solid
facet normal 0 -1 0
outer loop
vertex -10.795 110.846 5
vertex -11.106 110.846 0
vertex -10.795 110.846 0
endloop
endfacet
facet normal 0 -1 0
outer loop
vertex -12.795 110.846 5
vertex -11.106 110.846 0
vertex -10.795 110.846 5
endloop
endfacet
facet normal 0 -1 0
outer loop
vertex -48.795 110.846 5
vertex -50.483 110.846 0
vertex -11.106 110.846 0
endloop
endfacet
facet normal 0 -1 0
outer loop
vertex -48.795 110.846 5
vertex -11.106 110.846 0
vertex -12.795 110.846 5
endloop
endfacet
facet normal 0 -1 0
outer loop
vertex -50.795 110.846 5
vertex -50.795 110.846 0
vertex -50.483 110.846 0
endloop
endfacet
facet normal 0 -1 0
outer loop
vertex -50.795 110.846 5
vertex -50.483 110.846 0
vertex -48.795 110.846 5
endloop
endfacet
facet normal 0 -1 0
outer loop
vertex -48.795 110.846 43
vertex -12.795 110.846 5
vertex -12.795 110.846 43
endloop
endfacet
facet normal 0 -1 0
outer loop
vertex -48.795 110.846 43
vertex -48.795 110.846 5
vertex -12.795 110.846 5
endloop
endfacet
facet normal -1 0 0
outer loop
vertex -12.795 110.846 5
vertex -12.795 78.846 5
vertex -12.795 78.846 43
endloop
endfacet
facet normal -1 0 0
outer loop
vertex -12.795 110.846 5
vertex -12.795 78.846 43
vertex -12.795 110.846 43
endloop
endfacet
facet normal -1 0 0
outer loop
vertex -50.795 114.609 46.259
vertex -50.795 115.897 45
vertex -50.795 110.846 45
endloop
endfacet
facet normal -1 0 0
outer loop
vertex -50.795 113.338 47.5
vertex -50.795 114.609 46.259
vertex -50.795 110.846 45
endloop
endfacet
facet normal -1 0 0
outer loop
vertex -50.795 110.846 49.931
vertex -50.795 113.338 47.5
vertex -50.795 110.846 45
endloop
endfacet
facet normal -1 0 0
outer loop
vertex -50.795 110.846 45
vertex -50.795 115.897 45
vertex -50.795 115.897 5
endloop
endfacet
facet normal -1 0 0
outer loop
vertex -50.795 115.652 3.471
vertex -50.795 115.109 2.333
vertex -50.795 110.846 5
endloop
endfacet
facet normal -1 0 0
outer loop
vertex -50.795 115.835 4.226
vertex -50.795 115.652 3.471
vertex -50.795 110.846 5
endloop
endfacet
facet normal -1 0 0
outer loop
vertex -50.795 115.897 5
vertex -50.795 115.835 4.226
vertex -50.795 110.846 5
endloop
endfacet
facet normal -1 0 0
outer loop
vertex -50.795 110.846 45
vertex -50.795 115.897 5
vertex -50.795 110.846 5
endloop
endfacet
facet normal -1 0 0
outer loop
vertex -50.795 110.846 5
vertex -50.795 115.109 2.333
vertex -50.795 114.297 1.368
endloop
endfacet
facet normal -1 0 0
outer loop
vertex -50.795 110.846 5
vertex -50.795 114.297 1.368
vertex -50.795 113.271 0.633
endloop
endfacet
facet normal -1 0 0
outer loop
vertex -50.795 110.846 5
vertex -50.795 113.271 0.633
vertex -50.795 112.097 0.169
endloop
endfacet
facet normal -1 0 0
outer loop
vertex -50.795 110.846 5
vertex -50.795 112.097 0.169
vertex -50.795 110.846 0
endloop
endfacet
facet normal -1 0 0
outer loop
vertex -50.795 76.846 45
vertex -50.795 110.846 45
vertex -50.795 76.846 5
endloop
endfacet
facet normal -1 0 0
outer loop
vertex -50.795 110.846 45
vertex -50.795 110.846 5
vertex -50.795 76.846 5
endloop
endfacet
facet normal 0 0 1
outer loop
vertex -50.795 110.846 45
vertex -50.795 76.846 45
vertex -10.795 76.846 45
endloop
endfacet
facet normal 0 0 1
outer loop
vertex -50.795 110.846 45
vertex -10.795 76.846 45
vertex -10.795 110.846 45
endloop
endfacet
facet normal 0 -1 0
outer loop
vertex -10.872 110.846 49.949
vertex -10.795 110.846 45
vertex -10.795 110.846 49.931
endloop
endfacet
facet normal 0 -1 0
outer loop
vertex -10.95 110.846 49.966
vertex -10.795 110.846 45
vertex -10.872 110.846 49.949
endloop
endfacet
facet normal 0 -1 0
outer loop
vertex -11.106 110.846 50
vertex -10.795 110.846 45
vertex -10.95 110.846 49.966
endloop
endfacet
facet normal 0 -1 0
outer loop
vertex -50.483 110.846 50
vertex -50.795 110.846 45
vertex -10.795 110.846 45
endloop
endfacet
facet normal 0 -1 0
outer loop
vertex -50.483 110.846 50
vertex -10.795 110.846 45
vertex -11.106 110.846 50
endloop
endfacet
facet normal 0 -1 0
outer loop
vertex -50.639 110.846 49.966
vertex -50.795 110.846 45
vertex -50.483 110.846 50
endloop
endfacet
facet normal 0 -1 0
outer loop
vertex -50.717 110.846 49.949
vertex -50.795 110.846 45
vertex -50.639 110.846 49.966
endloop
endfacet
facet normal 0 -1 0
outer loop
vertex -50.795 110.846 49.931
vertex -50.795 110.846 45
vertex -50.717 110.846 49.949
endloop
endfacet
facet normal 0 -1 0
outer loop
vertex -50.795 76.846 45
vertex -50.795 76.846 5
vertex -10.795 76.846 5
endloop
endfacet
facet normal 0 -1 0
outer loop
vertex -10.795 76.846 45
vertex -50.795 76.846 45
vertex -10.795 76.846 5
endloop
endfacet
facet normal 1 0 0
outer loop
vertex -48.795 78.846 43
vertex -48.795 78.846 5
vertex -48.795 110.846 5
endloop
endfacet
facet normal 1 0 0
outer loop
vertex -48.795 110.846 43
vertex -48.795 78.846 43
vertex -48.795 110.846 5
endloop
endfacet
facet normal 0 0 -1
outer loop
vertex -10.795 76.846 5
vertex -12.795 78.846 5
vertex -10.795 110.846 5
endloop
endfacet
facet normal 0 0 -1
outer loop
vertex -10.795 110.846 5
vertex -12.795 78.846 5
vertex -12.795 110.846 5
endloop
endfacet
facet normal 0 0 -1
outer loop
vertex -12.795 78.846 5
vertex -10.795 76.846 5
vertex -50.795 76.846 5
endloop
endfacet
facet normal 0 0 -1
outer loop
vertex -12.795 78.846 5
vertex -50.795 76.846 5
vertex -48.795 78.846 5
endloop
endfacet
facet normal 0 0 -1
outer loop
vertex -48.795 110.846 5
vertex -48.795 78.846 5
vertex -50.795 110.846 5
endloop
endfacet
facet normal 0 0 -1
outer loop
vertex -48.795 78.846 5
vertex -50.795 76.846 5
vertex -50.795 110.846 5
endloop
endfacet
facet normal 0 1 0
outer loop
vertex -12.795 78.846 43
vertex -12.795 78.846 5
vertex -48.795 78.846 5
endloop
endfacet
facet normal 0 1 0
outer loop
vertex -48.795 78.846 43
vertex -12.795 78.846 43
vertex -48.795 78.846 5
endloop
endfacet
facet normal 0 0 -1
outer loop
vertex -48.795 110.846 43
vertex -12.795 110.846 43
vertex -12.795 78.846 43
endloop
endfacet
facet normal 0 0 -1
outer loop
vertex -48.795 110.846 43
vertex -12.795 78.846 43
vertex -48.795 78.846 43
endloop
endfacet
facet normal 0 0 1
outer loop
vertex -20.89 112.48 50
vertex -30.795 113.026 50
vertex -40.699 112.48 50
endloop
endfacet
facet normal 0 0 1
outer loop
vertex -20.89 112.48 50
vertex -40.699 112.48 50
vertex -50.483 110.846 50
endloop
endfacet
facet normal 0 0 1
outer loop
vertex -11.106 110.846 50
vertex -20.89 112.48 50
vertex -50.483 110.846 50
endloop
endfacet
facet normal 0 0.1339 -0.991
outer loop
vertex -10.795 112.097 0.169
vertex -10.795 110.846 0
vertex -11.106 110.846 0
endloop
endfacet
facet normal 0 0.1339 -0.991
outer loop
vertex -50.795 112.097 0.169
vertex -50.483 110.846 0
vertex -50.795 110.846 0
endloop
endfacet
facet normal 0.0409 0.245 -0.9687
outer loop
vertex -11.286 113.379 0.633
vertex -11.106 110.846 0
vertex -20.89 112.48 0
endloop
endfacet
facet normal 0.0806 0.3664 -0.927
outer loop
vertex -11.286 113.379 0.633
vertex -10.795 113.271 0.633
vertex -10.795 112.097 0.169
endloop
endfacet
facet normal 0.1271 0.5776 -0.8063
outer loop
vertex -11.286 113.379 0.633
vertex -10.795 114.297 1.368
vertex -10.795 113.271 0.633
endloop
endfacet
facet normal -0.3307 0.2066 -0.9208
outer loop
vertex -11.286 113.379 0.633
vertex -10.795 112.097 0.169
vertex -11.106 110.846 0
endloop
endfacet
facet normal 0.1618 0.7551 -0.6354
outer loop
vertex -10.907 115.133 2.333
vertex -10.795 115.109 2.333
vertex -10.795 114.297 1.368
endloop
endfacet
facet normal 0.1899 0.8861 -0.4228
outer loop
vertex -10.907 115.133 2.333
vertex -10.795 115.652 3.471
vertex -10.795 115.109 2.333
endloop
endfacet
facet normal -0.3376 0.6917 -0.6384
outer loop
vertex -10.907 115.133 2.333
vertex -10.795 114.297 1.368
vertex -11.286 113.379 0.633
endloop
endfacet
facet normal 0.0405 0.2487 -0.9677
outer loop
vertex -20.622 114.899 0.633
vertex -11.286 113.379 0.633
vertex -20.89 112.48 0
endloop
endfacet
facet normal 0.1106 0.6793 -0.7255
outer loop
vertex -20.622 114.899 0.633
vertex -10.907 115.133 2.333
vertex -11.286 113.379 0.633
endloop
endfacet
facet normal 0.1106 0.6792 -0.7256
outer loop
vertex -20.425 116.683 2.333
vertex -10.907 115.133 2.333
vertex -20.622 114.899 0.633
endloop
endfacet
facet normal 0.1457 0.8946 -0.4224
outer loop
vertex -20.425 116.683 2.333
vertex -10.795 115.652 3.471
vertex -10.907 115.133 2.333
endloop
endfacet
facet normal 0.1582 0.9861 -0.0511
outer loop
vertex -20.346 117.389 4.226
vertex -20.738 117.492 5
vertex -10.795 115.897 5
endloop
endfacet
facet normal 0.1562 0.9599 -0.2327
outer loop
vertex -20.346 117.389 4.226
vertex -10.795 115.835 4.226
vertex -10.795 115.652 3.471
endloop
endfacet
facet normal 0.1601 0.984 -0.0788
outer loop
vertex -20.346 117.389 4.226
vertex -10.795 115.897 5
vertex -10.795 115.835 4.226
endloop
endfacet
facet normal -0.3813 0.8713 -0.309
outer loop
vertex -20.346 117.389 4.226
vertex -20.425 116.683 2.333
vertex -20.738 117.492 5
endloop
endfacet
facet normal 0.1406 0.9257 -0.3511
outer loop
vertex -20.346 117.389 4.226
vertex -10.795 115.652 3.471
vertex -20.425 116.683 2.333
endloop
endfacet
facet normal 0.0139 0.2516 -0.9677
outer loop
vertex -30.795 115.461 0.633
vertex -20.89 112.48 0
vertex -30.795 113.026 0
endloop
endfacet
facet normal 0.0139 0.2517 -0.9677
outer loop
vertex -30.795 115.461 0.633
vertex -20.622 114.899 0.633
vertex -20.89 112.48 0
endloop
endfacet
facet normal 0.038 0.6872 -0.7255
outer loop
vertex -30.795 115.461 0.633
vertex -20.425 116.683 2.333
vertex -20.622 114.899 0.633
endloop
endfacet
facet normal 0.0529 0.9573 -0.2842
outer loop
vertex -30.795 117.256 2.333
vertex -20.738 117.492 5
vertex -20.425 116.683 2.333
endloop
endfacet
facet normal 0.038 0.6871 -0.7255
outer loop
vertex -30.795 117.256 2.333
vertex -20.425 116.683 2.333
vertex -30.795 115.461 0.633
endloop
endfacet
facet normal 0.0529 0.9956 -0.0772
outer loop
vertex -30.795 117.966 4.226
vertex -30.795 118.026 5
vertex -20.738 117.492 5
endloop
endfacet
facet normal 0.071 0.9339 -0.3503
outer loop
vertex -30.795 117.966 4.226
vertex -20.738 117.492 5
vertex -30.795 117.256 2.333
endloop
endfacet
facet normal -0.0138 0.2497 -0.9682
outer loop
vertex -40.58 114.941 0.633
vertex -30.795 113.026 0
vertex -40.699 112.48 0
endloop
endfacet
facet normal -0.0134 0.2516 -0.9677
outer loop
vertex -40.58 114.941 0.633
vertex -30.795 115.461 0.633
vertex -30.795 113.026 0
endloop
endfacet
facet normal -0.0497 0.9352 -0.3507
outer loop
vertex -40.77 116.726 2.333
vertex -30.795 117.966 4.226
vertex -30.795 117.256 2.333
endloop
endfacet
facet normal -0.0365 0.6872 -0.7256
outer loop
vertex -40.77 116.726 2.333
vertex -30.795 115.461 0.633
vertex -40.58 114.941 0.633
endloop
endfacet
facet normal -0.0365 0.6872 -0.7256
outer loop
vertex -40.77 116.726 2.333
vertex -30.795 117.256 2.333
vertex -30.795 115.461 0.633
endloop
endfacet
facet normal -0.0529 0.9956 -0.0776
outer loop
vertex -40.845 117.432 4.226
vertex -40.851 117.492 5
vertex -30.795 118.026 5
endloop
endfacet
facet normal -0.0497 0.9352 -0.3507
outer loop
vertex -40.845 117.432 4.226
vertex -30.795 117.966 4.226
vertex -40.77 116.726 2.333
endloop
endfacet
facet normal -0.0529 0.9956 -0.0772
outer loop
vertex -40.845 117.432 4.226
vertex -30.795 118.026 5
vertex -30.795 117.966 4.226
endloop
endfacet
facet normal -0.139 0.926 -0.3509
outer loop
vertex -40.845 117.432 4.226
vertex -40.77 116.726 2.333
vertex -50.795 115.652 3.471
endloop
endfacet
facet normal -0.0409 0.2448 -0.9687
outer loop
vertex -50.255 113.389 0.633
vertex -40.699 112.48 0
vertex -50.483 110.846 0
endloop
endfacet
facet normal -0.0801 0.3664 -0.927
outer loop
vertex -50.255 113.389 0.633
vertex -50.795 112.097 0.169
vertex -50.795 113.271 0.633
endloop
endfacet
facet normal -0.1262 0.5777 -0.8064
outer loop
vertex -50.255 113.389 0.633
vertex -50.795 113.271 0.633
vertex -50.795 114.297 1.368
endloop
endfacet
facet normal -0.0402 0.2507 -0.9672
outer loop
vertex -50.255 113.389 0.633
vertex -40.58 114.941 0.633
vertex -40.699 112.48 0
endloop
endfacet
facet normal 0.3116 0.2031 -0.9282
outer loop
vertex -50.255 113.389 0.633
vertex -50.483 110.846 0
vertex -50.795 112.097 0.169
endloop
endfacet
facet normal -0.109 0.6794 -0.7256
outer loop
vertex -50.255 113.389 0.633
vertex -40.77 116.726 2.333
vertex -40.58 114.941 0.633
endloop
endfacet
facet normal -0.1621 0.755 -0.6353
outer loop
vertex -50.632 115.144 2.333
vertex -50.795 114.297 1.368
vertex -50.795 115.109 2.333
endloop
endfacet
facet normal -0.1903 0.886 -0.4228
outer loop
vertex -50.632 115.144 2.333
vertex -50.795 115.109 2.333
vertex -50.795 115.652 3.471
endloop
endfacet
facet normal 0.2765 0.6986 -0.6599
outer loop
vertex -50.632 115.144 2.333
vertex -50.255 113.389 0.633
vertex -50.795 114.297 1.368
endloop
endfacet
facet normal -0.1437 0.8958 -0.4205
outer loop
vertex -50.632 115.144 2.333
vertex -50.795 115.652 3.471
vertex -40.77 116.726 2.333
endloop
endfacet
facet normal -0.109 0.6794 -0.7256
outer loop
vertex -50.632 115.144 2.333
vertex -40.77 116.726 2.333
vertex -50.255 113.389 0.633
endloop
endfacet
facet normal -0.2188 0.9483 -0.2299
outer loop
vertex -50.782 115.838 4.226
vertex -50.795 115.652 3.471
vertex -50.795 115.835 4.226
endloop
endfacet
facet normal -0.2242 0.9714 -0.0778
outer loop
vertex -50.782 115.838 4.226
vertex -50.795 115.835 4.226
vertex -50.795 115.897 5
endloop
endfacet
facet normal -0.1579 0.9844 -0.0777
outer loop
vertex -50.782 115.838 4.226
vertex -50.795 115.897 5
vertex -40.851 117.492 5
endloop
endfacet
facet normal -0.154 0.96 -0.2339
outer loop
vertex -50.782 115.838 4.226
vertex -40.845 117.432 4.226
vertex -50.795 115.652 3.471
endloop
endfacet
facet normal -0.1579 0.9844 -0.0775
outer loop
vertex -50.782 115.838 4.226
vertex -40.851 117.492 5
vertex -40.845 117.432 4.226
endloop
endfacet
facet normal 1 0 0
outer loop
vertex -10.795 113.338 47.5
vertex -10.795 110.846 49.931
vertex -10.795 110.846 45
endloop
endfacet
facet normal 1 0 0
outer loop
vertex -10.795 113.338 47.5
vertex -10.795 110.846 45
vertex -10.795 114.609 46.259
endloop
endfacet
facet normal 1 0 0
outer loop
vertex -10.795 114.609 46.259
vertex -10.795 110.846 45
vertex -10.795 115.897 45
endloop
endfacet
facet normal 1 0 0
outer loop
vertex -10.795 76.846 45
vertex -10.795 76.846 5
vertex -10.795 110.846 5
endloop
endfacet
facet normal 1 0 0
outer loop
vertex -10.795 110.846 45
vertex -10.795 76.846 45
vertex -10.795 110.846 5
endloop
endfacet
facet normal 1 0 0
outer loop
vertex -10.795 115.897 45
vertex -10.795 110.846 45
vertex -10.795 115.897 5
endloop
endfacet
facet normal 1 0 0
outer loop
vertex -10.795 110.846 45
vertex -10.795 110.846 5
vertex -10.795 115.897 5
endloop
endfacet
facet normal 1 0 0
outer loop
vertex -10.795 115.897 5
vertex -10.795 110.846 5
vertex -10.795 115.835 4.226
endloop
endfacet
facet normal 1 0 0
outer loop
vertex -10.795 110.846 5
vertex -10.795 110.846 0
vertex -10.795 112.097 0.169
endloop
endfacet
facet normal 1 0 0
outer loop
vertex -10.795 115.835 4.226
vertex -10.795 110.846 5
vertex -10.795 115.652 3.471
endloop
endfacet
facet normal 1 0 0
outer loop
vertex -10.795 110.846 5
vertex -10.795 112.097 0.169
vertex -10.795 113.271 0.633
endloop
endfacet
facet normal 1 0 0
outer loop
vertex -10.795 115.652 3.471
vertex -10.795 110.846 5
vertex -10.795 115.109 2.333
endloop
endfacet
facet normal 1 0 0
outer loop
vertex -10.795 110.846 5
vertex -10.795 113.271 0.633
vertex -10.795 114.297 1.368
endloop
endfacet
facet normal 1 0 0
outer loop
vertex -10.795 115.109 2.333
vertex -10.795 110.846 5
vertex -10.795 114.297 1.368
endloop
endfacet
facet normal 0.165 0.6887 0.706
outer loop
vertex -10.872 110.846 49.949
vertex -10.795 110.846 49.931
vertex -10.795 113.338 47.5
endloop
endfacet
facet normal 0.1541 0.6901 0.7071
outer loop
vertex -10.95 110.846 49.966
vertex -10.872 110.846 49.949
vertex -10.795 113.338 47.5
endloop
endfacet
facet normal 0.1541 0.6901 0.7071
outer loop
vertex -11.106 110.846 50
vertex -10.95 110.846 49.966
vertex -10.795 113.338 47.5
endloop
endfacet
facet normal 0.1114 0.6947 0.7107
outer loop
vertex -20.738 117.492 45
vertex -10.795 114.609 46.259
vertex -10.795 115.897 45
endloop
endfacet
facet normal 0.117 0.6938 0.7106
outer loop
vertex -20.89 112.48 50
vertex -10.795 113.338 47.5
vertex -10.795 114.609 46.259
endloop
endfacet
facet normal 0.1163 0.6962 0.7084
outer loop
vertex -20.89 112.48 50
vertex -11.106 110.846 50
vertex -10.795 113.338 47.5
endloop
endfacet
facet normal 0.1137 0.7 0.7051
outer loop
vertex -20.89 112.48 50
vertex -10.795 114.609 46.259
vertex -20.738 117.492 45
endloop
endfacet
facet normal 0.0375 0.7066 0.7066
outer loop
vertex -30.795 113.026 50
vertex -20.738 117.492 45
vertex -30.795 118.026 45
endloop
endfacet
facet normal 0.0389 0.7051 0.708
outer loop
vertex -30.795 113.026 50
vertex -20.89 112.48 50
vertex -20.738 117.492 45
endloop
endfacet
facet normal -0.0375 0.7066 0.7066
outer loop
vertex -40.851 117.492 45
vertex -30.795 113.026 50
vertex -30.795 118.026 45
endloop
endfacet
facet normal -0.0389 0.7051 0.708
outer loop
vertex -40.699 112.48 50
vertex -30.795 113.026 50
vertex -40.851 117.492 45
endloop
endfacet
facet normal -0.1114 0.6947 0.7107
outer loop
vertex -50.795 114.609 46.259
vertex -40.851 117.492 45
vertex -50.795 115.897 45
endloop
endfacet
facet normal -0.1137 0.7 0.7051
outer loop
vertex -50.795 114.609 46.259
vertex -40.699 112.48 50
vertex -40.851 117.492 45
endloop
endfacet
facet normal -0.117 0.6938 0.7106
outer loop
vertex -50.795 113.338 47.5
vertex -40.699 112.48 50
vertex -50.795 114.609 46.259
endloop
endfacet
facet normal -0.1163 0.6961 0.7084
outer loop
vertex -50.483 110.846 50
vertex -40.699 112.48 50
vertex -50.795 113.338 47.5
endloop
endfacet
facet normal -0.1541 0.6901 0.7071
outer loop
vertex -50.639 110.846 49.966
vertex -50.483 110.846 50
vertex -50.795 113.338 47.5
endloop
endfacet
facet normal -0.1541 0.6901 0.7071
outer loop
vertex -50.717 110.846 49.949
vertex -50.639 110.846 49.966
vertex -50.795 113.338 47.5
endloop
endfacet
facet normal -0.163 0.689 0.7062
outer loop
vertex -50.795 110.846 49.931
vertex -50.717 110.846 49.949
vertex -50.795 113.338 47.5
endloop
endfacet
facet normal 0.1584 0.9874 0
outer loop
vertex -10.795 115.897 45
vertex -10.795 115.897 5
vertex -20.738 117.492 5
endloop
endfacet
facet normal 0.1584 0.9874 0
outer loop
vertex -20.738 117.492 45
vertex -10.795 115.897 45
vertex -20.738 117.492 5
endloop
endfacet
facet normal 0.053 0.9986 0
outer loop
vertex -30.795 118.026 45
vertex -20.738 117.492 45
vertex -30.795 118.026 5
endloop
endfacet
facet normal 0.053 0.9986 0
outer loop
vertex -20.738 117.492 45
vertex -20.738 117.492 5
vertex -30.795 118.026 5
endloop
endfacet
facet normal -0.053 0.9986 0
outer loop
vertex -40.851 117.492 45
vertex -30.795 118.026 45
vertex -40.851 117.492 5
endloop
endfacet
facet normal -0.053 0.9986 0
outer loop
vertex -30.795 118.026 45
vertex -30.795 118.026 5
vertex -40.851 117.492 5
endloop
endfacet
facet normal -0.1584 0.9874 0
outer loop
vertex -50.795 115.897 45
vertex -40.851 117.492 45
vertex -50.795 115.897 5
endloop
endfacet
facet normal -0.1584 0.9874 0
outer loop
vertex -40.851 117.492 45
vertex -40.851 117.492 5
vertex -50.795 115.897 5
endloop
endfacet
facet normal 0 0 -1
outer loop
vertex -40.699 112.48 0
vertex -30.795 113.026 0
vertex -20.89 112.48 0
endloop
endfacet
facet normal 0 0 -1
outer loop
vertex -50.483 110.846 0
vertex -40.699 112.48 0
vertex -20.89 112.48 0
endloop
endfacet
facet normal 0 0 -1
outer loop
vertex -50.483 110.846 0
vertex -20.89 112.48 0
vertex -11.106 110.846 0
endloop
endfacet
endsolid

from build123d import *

# Parameters (mm, degrees)
SALIENTE_EXTRUIR1_DEPTH = 50
CROQUIS4_W              = 5
CROQUIS4_H              = 34
CORTAR_EXTRUIR3_DEPTH   = 50
CROQUIS5_W              = 36
CROQUIS5_H              = 32
CORTAR_EXTRUIR4_DEPTH   = 38
REDONDEO1_R             = 5
CHAFL_N1_SIZE           = 5


with BuildPart() as part:
    # Croquis1 → Saliente-Extruir1 (new body)
    with BuildSketch(Plane.XY):
        with BuildLine():
            Line((-50.7945892, 115.897083669), (-50.7945892, 110.077719464))
            Line((-50.7945892, 110.077719464), (-50.7945892, 76.846205564))
            Line((-50.7945892, 76.846205564), (-10.7945892, 76.846205564))
            Line((-10.7945892, 76.846205564), (-10.7945892, 110.077719464))
            Line((-10.7945892, 110.077719464), (-10.7945892, 115.897083669))
            ThreePointArc((-10.7945892, 115.897083669), (-30.7945892, 118.026205564), (-50.7945892, 115.897083669))
        make_face()
    extrude(amount=SALIENTE_EXTRUIR1_DEPTH)

    # Croquis4 → Cortar-Extruir3 (cut)
    with BuildSketch(Plane.ZY.offset(50.7945892)):
        with Locations((2.5, 93.846205564)):
            Rectangle(CROQUIS4_W, CROQUIS4_H)
        with Locations((47.5, 93.846205564)):
            Rectangle(CROQUIS4_W, CROQUIS4_H)
    extrude(amount=-CORTAR_EXTRUIR3_DEPTH, mode=Mode.SUBTRACT)

    # Croquis5 → Cortar-Extruir4 (cut)
    with BuildSketch(Plane(origin=(0, 0, 5), x_dir=(-1, 0, 0), z_dir=(0, 0, -1))):
        with Locations((30.7945892, 94.846205564)):
            Rectangle(CROQUIS5_W, CROQUIS5_H)
    extrude(amount=-CORTAR_EXTRUIR4_DEPTH, mode=Mode.SUBTRACT)

    # Redondeo1
    redondeo1_edges = [part.edges().sort_by_distance(p)[0] for p in [
        (-30.7945892, 118.026205564, 0),
    ]]
    fillet(redondeo1_edges, radius=REDONDEO1_R)

    # Chaflán1
    chafl_n1_edges = [part.edges().sort_by_distance(p)[0] for p in [
        (-30.7945892, 118.026205564, 50),
    ]]
    chamfer(chafl_n1_edges, length=CHAFL_N1_SIZE)


solid = part.part
